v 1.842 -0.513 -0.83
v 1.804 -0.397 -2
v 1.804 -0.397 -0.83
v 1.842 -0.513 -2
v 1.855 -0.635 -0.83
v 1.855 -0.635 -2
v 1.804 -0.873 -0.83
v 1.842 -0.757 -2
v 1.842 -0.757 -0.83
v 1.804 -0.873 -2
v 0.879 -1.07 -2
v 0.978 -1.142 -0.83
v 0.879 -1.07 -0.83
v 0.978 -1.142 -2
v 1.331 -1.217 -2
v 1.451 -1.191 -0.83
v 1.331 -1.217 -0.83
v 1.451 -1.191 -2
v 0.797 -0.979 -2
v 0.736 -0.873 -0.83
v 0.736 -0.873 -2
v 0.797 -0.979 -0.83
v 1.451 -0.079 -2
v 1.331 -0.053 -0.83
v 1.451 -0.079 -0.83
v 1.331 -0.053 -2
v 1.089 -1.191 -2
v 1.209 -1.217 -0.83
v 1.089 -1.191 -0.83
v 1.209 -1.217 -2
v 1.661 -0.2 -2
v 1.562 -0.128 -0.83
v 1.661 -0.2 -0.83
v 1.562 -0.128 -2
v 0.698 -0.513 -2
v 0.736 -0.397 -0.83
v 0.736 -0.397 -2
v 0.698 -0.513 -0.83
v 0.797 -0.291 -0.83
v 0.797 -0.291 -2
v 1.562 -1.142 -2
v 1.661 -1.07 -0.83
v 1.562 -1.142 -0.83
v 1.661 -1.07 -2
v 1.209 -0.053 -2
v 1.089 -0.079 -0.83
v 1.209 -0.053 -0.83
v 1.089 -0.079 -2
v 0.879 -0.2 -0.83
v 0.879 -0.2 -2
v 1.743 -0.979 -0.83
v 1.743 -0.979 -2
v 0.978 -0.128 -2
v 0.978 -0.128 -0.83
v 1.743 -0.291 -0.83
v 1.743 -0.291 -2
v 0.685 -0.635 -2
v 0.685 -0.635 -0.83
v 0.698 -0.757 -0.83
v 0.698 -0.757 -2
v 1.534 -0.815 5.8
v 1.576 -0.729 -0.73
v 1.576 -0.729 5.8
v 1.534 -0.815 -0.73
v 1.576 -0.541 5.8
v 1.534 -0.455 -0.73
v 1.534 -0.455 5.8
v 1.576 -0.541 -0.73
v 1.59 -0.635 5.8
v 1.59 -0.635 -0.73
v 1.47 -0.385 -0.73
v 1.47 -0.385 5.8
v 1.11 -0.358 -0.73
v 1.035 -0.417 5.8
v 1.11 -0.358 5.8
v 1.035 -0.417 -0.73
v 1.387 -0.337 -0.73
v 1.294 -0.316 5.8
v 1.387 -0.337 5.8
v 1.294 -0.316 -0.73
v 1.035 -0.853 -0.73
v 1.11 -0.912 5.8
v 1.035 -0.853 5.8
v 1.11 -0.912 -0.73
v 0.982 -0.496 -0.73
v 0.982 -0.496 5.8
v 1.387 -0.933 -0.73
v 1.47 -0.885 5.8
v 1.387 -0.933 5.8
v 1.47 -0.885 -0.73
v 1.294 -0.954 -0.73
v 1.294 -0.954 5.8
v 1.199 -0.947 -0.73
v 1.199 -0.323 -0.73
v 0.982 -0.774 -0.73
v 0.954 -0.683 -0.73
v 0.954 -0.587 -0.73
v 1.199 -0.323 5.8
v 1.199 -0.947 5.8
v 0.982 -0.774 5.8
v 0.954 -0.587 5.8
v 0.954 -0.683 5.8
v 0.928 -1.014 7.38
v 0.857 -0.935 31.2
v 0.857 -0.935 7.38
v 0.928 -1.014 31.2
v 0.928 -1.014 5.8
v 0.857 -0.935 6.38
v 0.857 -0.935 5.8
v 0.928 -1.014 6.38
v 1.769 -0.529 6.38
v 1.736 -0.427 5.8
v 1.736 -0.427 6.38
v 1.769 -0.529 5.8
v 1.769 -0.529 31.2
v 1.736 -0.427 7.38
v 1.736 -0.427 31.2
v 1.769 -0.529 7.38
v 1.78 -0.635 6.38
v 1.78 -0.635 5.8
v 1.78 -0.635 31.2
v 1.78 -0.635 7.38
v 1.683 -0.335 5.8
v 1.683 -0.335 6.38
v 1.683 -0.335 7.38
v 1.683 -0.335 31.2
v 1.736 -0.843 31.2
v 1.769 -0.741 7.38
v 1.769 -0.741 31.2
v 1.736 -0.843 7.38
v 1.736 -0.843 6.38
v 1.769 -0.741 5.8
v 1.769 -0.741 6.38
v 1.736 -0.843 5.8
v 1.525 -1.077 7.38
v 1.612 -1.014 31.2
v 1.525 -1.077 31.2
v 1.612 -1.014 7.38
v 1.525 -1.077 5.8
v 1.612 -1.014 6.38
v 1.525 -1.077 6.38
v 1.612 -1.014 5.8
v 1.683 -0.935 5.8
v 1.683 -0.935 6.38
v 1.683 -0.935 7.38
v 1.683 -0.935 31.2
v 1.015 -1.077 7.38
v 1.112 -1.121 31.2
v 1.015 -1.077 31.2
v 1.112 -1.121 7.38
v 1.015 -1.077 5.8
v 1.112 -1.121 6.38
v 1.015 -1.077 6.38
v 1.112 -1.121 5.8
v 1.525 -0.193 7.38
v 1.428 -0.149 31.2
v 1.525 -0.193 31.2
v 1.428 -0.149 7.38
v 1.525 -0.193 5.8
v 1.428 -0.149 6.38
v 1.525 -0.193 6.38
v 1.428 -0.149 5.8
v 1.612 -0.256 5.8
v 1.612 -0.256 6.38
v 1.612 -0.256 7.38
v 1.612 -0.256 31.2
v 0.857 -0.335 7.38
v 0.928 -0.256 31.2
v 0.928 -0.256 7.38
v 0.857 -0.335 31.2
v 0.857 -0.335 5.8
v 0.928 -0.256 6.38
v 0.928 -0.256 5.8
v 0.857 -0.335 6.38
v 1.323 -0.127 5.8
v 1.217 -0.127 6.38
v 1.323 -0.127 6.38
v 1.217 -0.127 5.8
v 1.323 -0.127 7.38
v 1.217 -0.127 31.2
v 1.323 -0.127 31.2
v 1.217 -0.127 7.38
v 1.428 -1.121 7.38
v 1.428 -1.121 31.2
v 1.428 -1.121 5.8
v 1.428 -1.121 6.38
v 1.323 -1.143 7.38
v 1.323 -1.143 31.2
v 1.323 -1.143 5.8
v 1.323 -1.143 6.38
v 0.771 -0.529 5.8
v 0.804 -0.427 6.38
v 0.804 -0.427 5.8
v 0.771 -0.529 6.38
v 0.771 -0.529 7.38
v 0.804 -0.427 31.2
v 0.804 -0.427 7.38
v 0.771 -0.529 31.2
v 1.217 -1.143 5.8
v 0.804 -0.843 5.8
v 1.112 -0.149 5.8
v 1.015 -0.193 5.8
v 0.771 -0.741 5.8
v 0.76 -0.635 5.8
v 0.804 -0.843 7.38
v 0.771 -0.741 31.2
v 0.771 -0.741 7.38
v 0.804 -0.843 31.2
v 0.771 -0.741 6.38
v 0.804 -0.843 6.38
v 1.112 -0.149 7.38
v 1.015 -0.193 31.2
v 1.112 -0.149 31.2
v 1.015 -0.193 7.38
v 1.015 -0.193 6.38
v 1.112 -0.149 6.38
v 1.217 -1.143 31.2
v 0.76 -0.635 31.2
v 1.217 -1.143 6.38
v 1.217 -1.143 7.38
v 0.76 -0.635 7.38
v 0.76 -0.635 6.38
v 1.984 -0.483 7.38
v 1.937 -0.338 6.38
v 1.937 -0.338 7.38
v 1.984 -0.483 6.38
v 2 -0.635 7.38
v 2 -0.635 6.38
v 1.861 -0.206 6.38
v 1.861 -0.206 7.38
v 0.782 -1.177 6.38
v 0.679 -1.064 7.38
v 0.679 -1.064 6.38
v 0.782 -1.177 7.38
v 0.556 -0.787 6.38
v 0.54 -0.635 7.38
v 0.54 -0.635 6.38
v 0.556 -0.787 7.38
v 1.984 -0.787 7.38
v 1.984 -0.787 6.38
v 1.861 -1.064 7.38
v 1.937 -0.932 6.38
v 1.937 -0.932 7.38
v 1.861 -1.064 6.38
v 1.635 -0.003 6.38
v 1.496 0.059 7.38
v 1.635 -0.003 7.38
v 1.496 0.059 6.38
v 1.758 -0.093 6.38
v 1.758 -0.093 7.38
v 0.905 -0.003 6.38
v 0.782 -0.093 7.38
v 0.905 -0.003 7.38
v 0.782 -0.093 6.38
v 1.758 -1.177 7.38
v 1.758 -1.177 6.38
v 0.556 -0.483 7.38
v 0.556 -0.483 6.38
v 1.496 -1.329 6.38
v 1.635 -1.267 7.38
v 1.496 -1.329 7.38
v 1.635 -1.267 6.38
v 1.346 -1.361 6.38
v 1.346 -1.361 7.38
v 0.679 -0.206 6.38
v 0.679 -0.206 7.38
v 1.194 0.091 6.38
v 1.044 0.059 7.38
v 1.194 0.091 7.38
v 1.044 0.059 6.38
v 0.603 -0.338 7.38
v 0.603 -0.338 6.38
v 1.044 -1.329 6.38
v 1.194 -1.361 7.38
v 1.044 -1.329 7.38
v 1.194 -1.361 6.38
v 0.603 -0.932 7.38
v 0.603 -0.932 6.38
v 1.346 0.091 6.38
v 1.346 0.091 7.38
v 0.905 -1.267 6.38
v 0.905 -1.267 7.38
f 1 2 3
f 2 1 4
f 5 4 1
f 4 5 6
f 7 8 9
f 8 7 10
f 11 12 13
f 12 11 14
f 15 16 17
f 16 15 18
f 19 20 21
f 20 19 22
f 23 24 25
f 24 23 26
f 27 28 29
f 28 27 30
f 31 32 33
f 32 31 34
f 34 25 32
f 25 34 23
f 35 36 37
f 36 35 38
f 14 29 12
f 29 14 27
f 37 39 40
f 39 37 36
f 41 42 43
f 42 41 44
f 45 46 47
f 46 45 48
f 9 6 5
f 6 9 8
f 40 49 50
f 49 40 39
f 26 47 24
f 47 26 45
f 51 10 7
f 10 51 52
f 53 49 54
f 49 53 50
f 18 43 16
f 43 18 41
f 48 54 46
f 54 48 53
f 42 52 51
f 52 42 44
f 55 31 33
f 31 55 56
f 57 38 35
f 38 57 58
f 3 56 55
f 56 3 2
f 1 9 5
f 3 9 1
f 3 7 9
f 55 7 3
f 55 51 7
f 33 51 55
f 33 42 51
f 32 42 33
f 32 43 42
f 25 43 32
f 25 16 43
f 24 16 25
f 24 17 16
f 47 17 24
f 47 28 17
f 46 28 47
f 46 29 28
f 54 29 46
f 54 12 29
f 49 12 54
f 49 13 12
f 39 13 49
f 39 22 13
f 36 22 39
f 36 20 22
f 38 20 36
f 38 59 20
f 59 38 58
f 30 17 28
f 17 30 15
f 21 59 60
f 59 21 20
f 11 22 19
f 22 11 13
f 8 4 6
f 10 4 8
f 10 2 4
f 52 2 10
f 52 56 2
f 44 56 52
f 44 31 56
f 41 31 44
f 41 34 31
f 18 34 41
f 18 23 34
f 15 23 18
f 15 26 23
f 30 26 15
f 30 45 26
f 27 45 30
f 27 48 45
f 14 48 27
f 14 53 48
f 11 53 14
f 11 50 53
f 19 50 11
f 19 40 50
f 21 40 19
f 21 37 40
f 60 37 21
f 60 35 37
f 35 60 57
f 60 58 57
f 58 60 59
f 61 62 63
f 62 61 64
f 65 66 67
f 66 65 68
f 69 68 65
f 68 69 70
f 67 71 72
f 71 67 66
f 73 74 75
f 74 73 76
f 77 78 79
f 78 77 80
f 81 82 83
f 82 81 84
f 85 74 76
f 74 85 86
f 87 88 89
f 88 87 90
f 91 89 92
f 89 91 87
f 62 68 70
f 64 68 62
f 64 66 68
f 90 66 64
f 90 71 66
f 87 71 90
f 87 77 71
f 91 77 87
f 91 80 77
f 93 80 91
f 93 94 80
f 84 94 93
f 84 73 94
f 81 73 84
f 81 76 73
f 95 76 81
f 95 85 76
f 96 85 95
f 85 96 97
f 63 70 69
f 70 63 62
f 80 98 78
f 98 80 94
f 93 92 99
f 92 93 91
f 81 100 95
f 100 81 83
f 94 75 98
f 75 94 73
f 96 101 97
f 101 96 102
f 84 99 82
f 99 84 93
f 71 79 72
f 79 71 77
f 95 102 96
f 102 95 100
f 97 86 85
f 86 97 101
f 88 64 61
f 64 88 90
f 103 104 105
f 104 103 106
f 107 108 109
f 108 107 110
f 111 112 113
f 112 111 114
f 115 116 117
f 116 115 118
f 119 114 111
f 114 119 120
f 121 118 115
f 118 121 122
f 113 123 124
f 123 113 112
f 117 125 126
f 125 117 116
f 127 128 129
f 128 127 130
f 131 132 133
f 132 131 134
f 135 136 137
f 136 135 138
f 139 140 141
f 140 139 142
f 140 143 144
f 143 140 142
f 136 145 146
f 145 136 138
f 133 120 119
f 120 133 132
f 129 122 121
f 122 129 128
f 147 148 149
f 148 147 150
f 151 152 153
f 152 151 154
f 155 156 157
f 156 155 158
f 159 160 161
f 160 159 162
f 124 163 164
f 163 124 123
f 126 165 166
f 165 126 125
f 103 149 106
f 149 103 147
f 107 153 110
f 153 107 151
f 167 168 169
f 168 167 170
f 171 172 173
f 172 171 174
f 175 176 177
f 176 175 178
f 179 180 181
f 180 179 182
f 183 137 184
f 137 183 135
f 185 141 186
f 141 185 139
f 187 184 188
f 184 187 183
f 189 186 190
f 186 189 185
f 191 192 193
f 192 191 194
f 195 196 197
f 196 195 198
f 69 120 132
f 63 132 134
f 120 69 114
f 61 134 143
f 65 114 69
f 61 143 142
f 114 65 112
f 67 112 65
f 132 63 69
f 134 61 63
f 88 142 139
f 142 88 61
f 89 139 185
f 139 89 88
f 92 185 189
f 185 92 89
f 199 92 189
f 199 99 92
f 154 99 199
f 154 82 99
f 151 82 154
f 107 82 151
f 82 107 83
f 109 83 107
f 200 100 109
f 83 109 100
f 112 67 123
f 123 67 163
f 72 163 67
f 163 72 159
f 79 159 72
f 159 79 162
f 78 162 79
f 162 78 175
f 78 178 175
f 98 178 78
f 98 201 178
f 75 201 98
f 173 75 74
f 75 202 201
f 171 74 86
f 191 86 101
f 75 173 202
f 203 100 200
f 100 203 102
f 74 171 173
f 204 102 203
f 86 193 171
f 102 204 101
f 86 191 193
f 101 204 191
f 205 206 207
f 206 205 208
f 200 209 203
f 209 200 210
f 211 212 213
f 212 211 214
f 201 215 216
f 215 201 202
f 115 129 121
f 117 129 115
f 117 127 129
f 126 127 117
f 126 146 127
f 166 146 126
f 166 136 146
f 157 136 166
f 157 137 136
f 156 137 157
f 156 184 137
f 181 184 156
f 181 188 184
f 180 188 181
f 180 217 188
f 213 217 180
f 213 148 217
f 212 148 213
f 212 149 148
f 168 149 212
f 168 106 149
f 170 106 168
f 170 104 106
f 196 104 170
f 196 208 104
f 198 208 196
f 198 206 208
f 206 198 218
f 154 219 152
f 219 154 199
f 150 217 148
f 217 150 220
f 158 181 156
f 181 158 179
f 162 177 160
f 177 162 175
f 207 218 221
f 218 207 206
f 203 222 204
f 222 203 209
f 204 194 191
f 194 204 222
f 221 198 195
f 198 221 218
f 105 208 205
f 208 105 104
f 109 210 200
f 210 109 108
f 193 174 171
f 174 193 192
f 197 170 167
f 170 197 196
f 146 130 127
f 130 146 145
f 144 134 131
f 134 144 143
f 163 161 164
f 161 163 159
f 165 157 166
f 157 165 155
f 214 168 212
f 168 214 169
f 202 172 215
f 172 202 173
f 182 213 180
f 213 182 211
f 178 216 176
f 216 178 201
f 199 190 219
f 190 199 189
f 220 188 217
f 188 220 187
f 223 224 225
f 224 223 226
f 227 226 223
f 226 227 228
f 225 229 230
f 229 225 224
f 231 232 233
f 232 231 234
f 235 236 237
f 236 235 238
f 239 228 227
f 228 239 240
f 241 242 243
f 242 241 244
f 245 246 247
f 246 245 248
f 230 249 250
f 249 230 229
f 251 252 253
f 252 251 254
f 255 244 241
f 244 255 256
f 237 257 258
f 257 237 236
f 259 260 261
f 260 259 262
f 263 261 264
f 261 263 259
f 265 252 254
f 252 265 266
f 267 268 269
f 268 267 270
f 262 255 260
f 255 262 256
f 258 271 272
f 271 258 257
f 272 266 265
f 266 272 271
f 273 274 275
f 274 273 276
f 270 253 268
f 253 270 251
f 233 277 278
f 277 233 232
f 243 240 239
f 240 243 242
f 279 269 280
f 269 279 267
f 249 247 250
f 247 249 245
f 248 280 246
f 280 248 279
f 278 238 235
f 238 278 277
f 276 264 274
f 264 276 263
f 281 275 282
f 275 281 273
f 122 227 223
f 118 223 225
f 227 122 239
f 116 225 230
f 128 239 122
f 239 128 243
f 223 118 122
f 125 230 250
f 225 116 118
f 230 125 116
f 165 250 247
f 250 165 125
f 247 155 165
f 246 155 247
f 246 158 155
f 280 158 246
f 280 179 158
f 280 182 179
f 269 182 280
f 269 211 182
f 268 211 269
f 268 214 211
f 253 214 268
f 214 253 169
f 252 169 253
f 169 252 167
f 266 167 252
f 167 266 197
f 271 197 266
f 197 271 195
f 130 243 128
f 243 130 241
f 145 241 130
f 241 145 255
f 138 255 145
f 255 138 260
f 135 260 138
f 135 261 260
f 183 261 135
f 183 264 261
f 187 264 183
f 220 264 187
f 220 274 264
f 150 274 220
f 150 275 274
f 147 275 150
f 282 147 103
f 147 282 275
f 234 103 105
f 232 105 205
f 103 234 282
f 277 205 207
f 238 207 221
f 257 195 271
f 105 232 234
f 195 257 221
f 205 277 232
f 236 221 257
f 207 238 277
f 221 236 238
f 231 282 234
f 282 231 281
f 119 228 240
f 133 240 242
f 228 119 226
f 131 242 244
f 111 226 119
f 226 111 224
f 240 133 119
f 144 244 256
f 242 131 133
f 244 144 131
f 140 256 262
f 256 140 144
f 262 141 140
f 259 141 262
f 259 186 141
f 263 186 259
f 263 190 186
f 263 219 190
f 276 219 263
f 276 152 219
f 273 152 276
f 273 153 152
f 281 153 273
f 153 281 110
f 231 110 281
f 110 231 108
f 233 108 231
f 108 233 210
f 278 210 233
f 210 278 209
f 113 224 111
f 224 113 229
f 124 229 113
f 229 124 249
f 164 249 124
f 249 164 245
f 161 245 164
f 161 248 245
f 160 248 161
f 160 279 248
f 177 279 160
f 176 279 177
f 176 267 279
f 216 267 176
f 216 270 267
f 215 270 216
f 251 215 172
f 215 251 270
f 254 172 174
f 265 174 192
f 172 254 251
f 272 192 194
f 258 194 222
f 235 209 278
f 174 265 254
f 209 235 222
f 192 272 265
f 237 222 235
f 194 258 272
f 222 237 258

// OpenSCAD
/*  This program is free software: you can redistribute it and/or modify
    it under the terms of the GNU General Public License as published by
    the Free Software Foundation, either version 3 of the License, or
    (at your option) any later version.

    This program is distributed in the hope that it will be useful,
    but WITHOUT ANY WARRANTY; without even the implied warranty of
    MERCHANTABILITY or FITNESS FOR A PARTICULAR PURPOSE.  See the
    GNU General Public License for more details.

    You should have received a copy of the GNU General Public License
    along with this program. If not, see <https://www.gnu.org/licenses/>.   
*/

translate([1.27,-1.27/2,-2])testpin(ontop=true,inset=0,movementdistance=2,probe="075-PRP2510S",socket="075-SDN250S");

//models the complete test pin
module testpin(ontop=true,inset=0,probe="",socket="",inset=0,movementdistance=0){
    $fs=0.3;
    rotate([0,ontop?0:180,0]){
        probe(probe=probe,inset=inset,movementdistance=movementdistance);
        socket(socket=socket);
    }
}

//models the hole that gets drilled through the sheet
module pinhole(socket=""){
   $fs=0.3;
   if(socket=="075-SDN250S"){
       // QATech.com 075-PRP259RS-S with socket 075-SDN250S
       cylinder(h=1000,d=1.35,center=true);
   }else if(socket=="075-PRP259RS-S"){
       //default: QATech.com 075-PRP259RS-S with socket 075-SDN250S
       cylinder(h=1000,d=1.35,center=true);
   }else{
       //default: QATech.com 075-PRP259RS-S with socket 075-SDN250S
       cylinder(h=1000,d=1.35,center=true);
   }   
}

module probe(probe="",inset=0,movementdistance=0){
   //Probe QATech.com 075-PRP259RS-S
    delay=inset/movementdistance;
    translate([0,0,$t>delay?($t-delay)*movementdistance:0]){ 
       $fs=0.1;
       if(probe=="075-PRP2501S"){
           color("Gold")
           //tip part 1
           translate([0,0,0])cylinder(h=1.27/2,d1=0,d2=1.17,center=false);
           //tip part 2
           color("Gold")
           translate([0,0,1.27/2])cylinder(h=1.27/2,d=1.17,center=false);
           //shaft 
           color("Gold")
           translate([0,0,1.27])cylinder(h=8,d=0.64,center=false);
       }else if(probe=="075-PRP2510S"){
           color("Gold")
           //tip part 1
           translate([0,0,0])cylinder(h=1.17,d=1.17,center=false);
           //tip part 2
           //shaft 
           color("Gold")
           translate([0,0,1.27])cylinder(h=8,d=0.64,center=false);
        }else if(probe=="075-PRP2520S"){
           color("Gold")
           //tip part 1
           translate([0,0,0])cylinder(h=2,d=0.64,center=false);
           //tip part 2
           //shaft 
           color("Gold")
           translate([0,0,1.27])cylinder(h=8,d=0.64,center=false);
       }else if(probe=="075-PRP2540S"){
           color("Gold")
           //tip part 1
           translate([0,0,0.64/2])sphere(d=0.64);
           //tip part 2
           color("Gold")
           translate([0,0,0.64/2])cylinder(h=2,d=0.64,center=false);
           //shaft 
           color("Gold")
           translate([0,0,2])cylinder(h=8,d=0.64,center=false); 
       }else if(probe=="075-PRP259RS-S"){
           color("Gold")
           //tip part 1
           //tip part 2
           translate([0,0,0])cylinder(h=2,d1=0,d2=0.64,center=false);
           //shaft 
           color("Gold")
           translate([0,0,2])cylinder(h=8,d=0.64,center=false);
       }else {//Default
           //tip part 1
           color("Blue")
           translate([0,0,-0.5])cylinder(h=0.5,d1=2,d2=3,center=false);
           //tip part 2
           color("Red")
           translate([0,0,0])cylinder(h=2,d1=3.5,d2=0.64,center=false);
           //shaft 
           color("Red")
           translate([0,0,2])cylinder(h=7.62,d=0.64,center=false);
       }
   }
}

module socket(socket=""){
   //Socket QATech.com 075-SDN250S 
   $fs=0.1;
   color("Gray")
   if(socket=="075-SDN250S"){
       // QATech.com 075-PRP259RS-S with socket 075-SDN250S
       translate([0,0,7.8])cylinder(h=25.4,d=1.021,center=false);
       translate([0,0,8.38])cylinder(h=1,d=1.46,center=false);      
   }else if(socket=="075-SDN250S"){
       translate([0,0,7.8])cylinder(h=25.4,d=1.021,center=false);
       translate([0,0,8.38])cylinder(h=1,d=1.46,center=false); 
   }else{
       //default: QATech.com 075-PRP259RS-S with socket 075-SDN250S
       translate([0,0,7.8])cylinder(h=25.4,d=1.021,center=false);
       translate([0,0,8.38])cylinder(h=1,d=1.46,center=false);
   }
}
